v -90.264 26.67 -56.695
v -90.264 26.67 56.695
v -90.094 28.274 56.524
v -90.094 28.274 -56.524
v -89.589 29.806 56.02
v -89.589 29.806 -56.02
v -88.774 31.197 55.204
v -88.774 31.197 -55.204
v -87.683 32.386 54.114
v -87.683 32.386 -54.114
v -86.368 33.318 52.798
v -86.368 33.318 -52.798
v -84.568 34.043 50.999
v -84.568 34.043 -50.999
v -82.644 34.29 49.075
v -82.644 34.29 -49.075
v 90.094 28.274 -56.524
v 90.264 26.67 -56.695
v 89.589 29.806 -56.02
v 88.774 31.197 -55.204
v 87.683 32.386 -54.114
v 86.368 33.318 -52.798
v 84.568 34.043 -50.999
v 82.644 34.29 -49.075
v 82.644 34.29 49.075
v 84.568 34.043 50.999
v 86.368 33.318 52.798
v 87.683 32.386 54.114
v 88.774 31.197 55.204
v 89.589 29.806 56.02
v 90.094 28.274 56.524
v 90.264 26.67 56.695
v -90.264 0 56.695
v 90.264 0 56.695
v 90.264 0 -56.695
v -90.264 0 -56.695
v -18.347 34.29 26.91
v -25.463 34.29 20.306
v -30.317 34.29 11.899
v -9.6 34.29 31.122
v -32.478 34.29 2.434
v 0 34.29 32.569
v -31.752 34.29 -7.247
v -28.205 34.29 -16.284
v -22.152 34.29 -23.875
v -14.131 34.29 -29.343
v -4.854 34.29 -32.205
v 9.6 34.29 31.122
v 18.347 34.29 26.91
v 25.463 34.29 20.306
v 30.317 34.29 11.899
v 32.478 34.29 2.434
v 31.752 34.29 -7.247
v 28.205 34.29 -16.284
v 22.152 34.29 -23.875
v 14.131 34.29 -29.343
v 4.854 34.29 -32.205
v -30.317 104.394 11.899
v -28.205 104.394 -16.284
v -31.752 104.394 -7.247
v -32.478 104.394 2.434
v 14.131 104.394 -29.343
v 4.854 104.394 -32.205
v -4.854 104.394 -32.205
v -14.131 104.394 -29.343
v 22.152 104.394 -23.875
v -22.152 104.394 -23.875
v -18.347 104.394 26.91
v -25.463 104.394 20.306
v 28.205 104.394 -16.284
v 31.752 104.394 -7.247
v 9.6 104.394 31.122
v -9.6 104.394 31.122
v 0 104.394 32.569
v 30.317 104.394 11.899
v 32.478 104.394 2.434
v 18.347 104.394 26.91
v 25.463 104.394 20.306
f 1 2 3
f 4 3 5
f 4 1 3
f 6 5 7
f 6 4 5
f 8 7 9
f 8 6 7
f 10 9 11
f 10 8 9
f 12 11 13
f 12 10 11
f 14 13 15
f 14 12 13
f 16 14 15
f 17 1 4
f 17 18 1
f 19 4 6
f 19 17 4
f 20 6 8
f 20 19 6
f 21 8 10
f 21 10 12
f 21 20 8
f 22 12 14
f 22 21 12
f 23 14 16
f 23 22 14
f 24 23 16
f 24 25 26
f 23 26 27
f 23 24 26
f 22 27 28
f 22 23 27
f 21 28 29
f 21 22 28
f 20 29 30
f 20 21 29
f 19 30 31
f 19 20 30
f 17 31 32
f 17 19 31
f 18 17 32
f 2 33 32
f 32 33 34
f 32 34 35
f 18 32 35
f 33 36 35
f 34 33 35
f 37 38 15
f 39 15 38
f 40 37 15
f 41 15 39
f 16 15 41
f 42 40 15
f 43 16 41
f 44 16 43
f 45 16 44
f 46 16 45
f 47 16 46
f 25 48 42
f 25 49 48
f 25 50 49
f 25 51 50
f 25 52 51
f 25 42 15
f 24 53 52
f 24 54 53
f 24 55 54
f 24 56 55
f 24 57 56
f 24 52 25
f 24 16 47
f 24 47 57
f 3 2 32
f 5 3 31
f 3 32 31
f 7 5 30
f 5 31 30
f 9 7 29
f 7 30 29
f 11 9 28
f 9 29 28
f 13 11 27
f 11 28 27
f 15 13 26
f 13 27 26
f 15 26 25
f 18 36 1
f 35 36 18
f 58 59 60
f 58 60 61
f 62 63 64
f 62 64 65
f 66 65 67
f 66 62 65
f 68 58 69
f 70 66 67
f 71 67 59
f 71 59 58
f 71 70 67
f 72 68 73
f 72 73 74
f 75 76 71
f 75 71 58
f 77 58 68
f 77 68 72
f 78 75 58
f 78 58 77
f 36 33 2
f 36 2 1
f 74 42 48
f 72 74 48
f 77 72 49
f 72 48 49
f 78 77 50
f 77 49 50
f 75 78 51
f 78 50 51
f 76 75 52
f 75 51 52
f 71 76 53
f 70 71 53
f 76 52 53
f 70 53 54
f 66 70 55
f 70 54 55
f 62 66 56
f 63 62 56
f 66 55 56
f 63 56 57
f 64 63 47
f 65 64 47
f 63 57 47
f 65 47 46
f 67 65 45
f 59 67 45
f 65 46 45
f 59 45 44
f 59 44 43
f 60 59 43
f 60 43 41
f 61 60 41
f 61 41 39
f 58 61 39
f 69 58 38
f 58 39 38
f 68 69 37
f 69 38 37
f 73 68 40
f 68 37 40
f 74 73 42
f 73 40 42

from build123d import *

# Parameters (mm, degrees)
SKETCH1_W           = 180.528529484
SKETCH1_H           = 113.389820172
BOSS_EXTRUDE1_DEPTH = 34.29
SKETCH3_R           = 32.56870091
BOSS_EXTRUDE2_DEPTH = 70.104
FILLET1_R           = 7.62


with BuildPart() as part:
    # Sketch1 → Boss-Extrude1 (new body)
    with BuildSketch(Plane(origin=(0, 0, 0), x_dir=(1, 0, 0), z_dir=(0, 1, 0))):
        Rectangle(SKETCH1_W, SKETCH1_H)
    extrude(amount=BOSS_EXTRUDE1_DEPTH)

    # Sketch3 → Boss-Extrude2 (add)
    with BuildSketch(Plane(origin=(0, 34.29, 0), x_dir=(1, 0, 0), z_dir=(0, 1, 0))):
        Circle(SKETCH3_R)
    extrude(amount=BOSS_EXTRUDE2_DEPTH)

    # Fillet1
    fillet1_edges = [part.edges().sort_by_distance(p)[0] for p in [
        (0, 34.29, 56.694910086),
        (0, 34.29, -56.694910086),
        (90.264264742, 34.29, 0),
        (-90.264264742, 34.29, 0),
    ]]
    fillet(fillet1_edges, radius=FILLET1_R)


solid = part.part
